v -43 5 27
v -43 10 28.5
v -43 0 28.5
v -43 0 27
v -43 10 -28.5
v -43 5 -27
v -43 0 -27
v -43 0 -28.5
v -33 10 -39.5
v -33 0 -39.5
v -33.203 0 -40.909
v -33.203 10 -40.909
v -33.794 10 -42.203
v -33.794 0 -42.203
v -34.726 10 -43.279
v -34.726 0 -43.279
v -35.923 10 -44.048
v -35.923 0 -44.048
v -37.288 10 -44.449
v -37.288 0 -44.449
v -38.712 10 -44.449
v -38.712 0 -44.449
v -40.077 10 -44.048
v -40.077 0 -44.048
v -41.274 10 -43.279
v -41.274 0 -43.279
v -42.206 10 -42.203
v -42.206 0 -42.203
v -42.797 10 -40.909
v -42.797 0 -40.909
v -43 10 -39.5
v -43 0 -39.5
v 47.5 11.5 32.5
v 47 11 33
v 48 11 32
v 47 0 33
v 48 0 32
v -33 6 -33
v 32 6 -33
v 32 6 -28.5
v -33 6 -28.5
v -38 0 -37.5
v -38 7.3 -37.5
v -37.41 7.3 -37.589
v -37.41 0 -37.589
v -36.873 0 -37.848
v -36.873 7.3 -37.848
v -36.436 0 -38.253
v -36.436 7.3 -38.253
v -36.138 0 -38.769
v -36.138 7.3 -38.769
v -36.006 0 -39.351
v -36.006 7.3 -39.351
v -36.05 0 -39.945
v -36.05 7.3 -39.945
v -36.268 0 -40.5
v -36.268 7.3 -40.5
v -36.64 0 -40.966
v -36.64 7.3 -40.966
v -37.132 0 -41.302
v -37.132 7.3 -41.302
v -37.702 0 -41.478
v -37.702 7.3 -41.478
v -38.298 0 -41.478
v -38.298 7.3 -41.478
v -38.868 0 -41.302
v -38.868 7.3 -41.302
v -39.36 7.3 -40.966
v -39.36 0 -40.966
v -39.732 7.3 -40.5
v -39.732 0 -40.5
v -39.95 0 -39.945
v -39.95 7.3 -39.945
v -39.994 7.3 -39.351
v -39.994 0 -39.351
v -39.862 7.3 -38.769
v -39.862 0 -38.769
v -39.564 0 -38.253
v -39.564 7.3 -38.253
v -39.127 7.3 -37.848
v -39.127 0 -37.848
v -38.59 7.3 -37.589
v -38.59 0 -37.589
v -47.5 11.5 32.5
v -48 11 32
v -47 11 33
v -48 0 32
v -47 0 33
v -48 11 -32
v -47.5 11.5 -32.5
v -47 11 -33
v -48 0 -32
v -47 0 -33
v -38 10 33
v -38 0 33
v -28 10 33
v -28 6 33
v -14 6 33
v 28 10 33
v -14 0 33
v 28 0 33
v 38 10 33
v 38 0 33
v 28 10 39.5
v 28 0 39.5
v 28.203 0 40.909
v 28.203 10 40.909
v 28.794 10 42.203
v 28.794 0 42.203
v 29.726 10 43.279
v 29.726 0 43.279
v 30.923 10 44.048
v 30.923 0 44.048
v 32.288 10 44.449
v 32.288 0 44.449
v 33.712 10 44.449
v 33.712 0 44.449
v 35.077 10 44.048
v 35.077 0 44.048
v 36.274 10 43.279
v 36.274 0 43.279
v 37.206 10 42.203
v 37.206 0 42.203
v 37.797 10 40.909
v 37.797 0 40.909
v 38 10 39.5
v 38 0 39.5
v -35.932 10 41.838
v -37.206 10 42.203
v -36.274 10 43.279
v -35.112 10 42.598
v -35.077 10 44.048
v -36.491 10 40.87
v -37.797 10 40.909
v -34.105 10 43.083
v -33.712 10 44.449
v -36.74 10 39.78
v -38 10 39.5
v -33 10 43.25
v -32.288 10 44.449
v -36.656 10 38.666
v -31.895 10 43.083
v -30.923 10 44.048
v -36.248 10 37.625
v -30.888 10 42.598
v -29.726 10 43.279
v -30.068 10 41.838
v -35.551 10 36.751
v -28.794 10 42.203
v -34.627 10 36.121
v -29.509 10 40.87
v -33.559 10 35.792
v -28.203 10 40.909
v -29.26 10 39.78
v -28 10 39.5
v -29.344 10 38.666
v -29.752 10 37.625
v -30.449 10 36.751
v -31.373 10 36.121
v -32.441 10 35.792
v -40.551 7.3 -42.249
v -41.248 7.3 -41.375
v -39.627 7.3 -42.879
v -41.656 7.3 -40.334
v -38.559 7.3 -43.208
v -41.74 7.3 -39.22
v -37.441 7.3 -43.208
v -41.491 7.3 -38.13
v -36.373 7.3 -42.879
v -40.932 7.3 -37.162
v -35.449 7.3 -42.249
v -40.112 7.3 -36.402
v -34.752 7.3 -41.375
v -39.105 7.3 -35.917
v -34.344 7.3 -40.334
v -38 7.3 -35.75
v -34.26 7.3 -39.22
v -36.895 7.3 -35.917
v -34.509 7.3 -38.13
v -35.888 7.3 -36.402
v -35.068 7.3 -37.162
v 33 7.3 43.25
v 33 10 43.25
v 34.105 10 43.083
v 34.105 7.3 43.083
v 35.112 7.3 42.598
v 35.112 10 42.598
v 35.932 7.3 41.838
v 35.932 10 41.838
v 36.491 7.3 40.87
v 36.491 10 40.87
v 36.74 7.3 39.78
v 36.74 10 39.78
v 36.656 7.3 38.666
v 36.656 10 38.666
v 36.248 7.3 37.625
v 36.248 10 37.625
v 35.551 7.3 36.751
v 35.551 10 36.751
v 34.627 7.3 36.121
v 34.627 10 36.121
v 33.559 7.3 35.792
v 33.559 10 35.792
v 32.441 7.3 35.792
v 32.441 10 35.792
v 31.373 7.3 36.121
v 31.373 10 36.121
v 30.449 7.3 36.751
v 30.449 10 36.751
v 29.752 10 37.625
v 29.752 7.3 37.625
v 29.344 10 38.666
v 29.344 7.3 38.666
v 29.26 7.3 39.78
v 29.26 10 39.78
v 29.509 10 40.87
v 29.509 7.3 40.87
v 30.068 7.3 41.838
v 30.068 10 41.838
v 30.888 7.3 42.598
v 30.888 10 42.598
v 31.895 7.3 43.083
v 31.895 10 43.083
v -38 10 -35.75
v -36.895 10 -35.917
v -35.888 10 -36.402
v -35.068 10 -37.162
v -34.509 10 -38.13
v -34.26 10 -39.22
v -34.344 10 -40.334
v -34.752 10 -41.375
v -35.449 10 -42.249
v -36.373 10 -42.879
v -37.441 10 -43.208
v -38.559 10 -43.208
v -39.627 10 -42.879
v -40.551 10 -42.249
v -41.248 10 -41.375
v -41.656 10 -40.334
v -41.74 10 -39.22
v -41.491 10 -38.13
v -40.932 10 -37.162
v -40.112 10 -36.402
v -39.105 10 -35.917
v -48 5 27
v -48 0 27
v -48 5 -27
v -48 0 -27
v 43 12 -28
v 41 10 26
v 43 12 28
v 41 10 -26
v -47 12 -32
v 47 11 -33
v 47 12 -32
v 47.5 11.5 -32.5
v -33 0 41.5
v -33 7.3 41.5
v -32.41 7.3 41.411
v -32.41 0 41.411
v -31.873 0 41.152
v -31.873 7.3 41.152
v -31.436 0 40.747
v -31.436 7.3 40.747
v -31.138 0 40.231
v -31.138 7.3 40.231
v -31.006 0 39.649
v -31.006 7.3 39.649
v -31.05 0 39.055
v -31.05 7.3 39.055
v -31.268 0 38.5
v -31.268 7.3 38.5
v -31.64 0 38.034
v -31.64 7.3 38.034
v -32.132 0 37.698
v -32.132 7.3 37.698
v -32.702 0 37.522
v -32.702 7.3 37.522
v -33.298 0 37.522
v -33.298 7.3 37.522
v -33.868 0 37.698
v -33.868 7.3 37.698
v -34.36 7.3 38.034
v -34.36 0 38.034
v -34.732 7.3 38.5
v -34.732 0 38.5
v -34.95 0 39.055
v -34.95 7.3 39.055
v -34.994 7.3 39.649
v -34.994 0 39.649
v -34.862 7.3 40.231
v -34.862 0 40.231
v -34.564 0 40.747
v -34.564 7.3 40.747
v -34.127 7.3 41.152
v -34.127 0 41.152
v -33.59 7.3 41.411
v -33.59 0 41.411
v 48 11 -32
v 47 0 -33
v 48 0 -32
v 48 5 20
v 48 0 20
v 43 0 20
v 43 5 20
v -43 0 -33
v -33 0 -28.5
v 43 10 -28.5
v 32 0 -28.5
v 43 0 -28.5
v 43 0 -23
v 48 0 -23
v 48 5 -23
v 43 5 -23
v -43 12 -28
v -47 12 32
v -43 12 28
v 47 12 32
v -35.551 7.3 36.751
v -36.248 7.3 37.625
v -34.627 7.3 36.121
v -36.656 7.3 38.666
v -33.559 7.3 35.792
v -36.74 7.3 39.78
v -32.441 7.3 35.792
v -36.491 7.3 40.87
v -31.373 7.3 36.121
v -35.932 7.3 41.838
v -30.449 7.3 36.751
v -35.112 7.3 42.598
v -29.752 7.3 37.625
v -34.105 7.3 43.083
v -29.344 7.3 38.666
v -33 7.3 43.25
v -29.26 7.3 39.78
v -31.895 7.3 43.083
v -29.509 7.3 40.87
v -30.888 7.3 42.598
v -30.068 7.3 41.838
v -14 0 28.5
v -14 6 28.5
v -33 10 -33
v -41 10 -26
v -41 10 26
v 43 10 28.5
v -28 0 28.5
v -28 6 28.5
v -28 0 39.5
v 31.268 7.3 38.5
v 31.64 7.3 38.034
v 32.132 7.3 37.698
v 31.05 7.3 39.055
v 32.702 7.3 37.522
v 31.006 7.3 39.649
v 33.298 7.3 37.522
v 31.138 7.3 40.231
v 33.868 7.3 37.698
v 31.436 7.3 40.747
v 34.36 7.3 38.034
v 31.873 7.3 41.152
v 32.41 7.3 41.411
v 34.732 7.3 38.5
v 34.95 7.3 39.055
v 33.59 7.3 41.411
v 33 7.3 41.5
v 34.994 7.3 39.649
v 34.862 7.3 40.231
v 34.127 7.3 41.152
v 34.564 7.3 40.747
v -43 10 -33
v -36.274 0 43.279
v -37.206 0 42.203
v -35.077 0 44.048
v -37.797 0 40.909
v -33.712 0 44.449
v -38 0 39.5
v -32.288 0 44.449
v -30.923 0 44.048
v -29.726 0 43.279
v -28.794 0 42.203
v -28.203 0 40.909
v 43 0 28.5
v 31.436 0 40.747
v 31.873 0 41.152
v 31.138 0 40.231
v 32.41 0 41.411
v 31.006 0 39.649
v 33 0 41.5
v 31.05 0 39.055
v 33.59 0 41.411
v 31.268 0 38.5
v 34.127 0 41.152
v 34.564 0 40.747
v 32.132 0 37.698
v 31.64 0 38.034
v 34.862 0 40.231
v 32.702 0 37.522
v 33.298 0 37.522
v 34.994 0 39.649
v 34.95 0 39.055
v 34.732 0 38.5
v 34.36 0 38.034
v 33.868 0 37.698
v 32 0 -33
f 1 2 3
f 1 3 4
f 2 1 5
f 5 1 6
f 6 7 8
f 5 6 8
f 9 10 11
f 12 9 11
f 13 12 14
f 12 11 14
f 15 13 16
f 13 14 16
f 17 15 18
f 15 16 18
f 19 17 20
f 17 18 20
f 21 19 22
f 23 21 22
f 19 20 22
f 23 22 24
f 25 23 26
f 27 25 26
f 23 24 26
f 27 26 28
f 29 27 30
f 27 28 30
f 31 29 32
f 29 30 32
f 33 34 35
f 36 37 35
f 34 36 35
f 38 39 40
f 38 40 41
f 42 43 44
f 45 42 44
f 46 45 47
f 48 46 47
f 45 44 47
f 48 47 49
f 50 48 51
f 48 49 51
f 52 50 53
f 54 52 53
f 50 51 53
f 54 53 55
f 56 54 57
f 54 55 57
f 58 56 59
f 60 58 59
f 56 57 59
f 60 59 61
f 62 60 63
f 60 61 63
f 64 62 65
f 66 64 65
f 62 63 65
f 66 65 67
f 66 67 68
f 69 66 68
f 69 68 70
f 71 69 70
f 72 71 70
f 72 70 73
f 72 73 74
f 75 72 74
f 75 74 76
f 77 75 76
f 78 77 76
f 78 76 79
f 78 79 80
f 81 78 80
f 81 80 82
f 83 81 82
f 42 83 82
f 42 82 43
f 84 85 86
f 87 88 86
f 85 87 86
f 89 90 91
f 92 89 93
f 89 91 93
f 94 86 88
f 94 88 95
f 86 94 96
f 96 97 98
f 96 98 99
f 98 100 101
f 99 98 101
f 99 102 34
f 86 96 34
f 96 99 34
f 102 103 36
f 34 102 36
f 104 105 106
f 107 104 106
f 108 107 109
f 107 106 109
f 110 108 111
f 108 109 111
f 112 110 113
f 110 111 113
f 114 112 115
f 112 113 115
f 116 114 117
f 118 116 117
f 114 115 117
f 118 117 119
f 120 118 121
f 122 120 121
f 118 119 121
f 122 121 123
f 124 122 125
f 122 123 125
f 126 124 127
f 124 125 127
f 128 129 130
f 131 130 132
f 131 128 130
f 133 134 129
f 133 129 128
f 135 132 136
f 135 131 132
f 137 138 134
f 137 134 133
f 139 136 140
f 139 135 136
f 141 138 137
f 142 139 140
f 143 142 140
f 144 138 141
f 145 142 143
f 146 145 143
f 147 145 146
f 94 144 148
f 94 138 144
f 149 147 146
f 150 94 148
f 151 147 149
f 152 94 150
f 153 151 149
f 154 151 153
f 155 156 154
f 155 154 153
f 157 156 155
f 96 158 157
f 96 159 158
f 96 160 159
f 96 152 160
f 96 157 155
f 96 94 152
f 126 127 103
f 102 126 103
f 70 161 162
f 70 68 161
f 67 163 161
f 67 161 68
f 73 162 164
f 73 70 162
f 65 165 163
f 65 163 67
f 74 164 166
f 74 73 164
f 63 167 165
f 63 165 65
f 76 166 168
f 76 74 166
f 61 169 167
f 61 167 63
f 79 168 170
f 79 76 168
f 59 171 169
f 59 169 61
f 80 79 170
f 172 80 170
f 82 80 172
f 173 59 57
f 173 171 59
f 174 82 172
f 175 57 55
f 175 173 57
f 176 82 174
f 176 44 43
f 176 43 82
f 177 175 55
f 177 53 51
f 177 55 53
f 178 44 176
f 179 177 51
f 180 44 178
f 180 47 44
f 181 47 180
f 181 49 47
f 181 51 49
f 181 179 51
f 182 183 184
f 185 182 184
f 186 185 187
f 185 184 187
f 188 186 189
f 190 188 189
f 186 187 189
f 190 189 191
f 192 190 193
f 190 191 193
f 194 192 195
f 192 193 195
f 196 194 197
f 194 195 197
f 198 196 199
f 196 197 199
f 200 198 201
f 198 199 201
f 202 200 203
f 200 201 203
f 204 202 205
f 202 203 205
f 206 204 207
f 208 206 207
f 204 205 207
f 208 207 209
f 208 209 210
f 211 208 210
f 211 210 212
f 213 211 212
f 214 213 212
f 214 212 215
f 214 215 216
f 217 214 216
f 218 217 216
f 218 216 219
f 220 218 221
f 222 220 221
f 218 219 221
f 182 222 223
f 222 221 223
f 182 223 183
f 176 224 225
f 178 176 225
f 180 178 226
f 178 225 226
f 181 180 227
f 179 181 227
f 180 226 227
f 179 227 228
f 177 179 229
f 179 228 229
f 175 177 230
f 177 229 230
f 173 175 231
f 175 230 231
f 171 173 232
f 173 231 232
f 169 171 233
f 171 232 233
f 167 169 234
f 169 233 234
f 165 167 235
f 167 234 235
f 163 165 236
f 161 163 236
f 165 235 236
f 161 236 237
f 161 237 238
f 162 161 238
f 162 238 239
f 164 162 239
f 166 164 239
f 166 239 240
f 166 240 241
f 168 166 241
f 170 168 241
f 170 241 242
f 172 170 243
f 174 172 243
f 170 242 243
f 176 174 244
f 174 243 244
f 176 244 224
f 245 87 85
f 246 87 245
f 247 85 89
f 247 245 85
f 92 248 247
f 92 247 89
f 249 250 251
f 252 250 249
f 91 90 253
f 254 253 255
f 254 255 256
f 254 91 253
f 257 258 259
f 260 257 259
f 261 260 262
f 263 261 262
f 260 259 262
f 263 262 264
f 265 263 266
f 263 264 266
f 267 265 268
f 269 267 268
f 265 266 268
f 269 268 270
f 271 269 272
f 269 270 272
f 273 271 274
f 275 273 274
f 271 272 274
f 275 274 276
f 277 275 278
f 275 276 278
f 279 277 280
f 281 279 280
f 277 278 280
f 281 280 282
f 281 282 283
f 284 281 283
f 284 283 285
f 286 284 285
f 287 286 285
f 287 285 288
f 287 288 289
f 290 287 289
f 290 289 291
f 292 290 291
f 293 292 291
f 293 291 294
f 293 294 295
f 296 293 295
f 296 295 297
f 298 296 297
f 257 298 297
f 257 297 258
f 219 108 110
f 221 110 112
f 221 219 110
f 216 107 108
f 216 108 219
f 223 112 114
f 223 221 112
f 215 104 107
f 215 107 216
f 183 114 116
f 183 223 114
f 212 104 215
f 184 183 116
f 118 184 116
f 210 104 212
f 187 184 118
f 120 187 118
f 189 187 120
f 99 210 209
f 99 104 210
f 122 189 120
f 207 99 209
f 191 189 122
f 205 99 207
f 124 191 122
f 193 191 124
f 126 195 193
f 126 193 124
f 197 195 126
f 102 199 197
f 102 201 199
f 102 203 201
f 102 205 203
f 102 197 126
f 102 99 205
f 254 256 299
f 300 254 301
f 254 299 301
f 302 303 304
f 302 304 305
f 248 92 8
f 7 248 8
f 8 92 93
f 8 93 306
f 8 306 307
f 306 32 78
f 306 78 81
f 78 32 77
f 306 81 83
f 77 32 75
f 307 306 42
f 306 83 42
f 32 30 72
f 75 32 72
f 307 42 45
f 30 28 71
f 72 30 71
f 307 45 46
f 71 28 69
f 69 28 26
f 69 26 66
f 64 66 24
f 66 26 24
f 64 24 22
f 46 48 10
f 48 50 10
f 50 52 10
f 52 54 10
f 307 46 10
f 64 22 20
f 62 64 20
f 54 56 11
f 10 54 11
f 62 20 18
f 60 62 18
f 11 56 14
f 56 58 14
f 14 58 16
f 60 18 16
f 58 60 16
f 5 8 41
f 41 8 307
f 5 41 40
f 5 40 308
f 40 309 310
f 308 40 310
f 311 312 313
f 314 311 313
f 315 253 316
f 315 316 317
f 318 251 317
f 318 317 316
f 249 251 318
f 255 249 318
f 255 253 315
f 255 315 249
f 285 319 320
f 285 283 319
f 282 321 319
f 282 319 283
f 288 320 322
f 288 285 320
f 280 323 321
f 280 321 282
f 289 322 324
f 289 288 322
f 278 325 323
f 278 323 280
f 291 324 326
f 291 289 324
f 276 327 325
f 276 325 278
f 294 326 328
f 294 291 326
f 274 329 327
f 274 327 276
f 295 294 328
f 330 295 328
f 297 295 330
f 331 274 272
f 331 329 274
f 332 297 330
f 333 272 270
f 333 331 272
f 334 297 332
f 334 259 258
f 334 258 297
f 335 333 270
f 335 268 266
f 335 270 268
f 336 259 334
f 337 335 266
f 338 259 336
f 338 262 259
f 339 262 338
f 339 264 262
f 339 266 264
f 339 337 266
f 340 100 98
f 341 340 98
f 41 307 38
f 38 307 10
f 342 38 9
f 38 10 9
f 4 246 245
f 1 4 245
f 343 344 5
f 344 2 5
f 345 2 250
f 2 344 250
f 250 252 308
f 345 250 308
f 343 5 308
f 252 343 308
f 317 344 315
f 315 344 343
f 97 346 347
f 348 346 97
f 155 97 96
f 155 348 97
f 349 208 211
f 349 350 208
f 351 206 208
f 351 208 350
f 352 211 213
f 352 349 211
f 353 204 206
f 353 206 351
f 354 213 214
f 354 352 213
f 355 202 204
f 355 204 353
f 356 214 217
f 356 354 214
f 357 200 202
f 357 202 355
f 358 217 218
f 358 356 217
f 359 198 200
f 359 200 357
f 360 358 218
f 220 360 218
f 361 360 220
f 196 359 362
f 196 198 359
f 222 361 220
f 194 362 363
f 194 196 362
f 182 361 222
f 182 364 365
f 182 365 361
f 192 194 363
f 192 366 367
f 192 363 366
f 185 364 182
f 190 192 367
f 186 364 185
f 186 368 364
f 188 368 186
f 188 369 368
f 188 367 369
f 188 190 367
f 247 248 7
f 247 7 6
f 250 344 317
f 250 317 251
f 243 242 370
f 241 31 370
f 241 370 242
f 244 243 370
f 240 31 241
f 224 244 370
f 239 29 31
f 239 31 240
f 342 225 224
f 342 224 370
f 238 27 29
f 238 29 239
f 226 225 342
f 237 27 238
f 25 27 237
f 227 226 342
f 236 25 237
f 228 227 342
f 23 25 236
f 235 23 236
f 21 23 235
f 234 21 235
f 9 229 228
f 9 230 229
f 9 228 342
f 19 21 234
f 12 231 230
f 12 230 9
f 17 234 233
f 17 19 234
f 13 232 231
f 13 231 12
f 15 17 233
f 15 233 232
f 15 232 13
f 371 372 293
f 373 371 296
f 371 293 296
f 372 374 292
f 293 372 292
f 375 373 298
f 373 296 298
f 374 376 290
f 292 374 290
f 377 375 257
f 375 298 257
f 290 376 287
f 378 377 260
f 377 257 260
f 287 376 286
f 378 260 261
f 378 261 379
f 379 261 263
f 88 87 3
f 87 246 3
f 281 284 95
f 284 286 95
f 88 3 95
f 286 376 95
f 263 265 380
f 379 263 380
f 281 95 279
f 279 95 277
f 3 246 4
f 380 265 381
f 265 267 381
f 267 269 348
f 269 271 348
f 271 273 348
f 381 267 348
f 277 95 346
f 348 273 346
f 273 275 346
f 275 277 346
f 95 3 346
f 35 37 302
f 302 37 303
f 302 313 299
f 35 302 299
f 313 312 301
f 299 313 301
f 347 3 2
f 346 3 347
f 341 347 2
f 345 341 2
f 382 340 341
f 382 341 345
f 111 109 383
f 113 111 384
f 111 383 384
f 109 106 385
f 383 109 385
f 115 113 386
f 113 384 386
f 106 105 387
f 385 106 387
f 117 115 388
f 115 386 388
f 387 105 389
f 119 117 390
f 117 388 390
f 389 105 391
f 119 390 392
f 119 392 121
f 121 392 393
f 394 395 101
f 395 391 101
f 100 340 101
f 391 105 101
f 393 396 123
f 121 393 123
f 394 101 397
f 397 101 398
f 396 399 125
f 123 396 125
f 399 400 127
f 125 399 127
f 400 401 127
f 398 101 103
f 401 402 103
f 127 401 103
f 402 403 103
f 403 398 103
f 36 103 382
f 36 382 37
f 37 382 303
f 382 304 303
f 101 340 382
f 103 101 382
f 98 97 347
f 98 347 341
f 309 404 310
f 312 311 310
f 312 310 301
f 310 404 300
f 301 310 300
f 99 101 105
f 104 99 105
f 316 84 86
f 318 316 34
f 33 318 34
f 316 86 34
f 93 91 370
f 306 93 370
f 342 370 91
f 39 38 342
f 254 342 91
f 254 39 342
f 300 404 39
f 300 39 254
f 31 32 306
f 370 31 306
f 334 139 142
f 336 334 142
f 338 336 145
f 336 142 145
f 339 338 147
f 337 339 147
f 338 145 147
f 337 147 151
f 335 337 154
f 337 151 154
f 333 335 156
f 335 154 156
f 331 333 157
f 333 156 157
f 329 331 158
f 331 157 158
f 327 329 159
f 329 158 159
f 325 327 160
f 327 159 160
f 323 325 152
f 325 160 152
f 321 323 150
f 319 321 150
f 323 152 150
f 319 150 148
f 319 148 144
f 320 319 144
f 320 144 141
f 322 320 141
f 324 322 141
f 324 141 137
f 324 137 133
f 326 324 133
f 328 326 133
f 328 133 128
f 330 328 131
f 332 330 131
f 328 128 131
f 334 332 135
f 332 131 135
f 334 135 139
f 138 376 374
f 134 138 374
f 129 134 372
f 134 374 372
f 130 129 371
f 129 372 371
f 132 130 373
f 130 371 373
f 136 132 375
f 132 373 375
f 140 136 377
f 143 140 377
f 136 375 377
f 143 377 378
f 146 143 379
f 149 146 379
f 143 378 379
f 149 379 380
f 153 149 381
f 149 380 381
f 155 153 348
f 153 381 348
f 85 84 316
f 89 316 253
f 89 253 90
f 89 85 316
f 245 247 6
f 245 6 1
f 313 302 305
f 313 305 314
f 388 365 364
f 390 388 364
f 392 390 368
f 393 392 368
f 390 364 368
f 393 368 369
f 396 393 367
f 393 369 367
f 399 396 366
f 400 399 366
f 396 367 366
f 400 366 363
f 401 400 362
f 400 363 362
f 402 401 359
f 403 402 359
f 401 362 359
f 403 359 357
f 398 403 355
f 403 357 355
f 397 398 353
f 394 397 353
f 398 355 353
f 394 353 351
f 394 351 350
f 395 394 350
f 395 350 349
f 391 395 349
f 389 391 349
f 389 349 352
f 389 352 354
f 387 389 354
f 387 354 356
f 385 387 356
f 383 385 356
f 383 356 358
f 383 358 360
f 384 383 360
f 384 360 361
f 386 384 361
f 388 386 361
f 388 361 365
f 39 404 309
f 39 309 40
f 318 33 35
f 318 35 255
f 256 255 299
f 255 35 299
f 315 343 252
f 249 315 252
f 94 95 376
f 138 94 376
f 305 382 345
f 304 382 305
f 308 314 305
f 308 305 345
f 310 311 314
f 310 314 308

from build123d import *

# Parameters (mm, degrees)
SKETCH1_W           = 86
SKETCH1_H           = 57
BOSS_EXTRUDE1_DEPTH = 10
SKETCH2_R           = 2
CUT_EXTRUDE1_DEPTH  = 67.213669284
SKETCH4_W           = 96
SKETCH4_H           = 66
SKETCH4_W_2         = 82
SKETCH4_H_2         = 52
BOSS_EXTRUDE2_DEPTH = 2
SKETCH6_W           = 54
SKETCH6_H           = 5
CUT_EXTRUDE2_DEPTH  = 5
SKETCH7_W           = 43
SKETCH7_H           = 5
CUT_EXTRUDE3_DEPTH  = 5
CHAMFER1_SIZE       = 2
CHAMFER2_SIZE       = 1
CHAMFER3_SIZE       = 1
CHAMFER4_SIZE       = 1
SKETCH9_R           = 3.75
CUT_EXTRUDE4_DEPTH  = 2.7
SKETCH10_W          = 65
SKETCH10_H          = 6
CUT_EXTRUDE5_DEPTH  = 4.5
SKETCH11_W          = 14
SKETCH11_H          = 6
CUT_EXTRUDE6_DEPTH  = 4.5


with BuildPart() as part:
    # Sketch1 → Boss-Extrude1 (new body)
    with BuildSketch(Plane(origin=(0, 0, 0), x_dir=(1, 0, 0), z_dir=(0, 1, 0))):
        with BuildLine():
            Line((48, -33), (48, 33))
            Line((48, 33), (-33, 33))
            Line((-33, 33), (-33, 39.5))
            ThreePointArc((-33, 39.5), (-38, 44.5), (-43, 39.5))
            Line((-43, 39.5), (-43, 33))
            Line((-43, 33), (-48, 33))
            Line((-48, 33), (-48, -33))
            Line((-48, -33), (-38, -33))
            Line((-38, -33), (-38, -39.5))
            ThreePointArc((-38, -39.5), (-33, -44.5), (-28, -39.5))
            Line((-28, -39.5), (-28, -33))
            Line((-28, -33), (28, -33))
            Line((28, -33), (28, -39.5))
            ThreePointArc((28, -39.5), (33, -44.5), (38, -39.5))
            Line((38, -39.5), (38, -33))
            Line((38, -33), (48, -33))
        make_face()
        Rectangle(SKETCH1_W, SKETCH1_H, mode=Mode.SUBTRACT)
    extrude(amount=BOSS_EXTRUDE1_DEPTH)

    # Sketch2 → Cut-Extrude1 (cut, through all)
    with BuildSketch(Plane(origin=(0, 10, 0), x_dir=(1, 0, 0), z_dir=(0, 1, 0))):
        with Locations(Location((-38, 39.5, 0), (0, 0, 270))):
            Circle(SKETCH2_R)
        with Locations(Location((33, -39.5, 0), (0, 0, 270))):
            Circle(SKETCH2_R)
        with Locations(Location((-33, -39.5, 0), (0, 0, 270))):
            Circle(SKETCH2_R)
    extrude(amount=-CUT_EXTRUDE1_DEPTH, mode=Mode.SUBTRACT)

    # Sketch4 → Boss-Extrude2 (add)
    with BuildSketch(Plane(origin=(0, 10, 0), x_dir=(1, 0, 0), z_dir=(0, 1, 0))):
        Rectangle(SKETCH4_W, SKETCH4_H)
        Rectangle(SKETCH4_W_2, SKETCH4_H_2, mode=Mode.SUBTRACT)
    extrude(amount=BOSS_EXTRUDE2_DEPTH)

    # Sketch6 → Cut-Extrude2 (cut)
    with BuildSketch(Plane.ZY.offset(48)):
        with Locations((0, 2.5)):
            Rectangle(SKETCH6_W, SKETCH6_H)
    extrude(amount=-CUT_EXTRUDE2_DEPTH, mode=Mode.SUBTRACT)

    # Sketch7 → Cut-Extrude3 (cut)
    with BuildSketch(Plane(origin=(48, 0, 0), x_dir=(0, 0, -1), z_dir=(1, 0, 0))):
        with Locations((1.5, 2.5)):
            Rectangle(SKETCH7_W, SKETCH7_H)
    extrude(amount=-CUT_EXTRUDE3_DEPTH, mode=Mode.SUBTRACT)

    # Chamfer1
    chamfer1_edges = [part.edges().sort_by_distance(p)[0] for p in [
        (-41, 12, 0),
        (0, 12, 26),
        (41, 12, 0),
        (0, 12, -26),
    ]]
    chamfer(chamfer1_edges, length=CHAMFER1_SIZE - 0.0001)  # a hair under: the kernel refuses the full size

    # Chamfer2
    chamfer2_edges = [part.edges().sort_by_distance(p)[0] for p in [
        (-48, 12, 0),
        (0, 12, 33),
        (48, 12, 0),
        (0, 12, -33),
    ]]
    chamfer(chamfer2_edges, length=CHAMFER2_SIZE)

    # Chamfer3
    chamfer3_edges = [part.edges().sort_by_distance(p)[0] for p in [
        (-48, 5.5, -33),
    ]]
    chamfer(chamfer3_edges, length=CHAMFER3_SIZE)

    # Chamfer4
    chamfer4_edges = [part.edges().sort_by_distance(p)[0] for p in [
        (48, 5.5, 33),
        (-48, 5.5, 33),
        (48, 5.5, -33),
    ]]
    chamfer(chamfer4_edges, length=CHAMFER4_SIZE)

    # Sketch9 → Cut-Extrude4 (cut)
    with BuildSketch(Plane(origin=(0, 10, 0), x_dir=(1, 0, 0), z_dir=(0, 1, 0))):
        with Locations(Location((-38, 39.5, 0), (0, 0, 270))):
            Circle(SKETCH9_R)
        with Locations(Location((-33, -39.5, 0), (0, 0, 270))):
            Circle(SKETCH9_R)
        with Locations(Location((33, -39.5, 0), (0, 0, 270))):
            Circle(SKETCH9_R)
    extrude(amount=-CUT_EXTRUDE4_DEPTH, mode=Mode.SUBTRACT)

    # Sketch10 → Cut-Extrude5 (cut)
    with BuildSketch(Plane(origin=(0, 0, -33), x_dir=(-1, 0, 0), z_dir=(0, 0, -1))):
        with Locations((0.5, 3)):
            Rectangle(SKETCH10_W, SKETCH10_H)
    extrude(amount=-CUT_EXTRUDE5_DEPTH, mode=Mode.SUBTRACT)

    # Sketch11 → Cut-Extrude6 (cut)
    with BuildSketch(Plane.XY.offset(33)):
        with Locations((-21, 3)):
            Rectangle(SKETCH11_W, SKETCH11_H)
    extrude(amount=-CUT_EXTRUDE6_DEPTH, mode=Mode.SUBTRACT)


solid = part.part
